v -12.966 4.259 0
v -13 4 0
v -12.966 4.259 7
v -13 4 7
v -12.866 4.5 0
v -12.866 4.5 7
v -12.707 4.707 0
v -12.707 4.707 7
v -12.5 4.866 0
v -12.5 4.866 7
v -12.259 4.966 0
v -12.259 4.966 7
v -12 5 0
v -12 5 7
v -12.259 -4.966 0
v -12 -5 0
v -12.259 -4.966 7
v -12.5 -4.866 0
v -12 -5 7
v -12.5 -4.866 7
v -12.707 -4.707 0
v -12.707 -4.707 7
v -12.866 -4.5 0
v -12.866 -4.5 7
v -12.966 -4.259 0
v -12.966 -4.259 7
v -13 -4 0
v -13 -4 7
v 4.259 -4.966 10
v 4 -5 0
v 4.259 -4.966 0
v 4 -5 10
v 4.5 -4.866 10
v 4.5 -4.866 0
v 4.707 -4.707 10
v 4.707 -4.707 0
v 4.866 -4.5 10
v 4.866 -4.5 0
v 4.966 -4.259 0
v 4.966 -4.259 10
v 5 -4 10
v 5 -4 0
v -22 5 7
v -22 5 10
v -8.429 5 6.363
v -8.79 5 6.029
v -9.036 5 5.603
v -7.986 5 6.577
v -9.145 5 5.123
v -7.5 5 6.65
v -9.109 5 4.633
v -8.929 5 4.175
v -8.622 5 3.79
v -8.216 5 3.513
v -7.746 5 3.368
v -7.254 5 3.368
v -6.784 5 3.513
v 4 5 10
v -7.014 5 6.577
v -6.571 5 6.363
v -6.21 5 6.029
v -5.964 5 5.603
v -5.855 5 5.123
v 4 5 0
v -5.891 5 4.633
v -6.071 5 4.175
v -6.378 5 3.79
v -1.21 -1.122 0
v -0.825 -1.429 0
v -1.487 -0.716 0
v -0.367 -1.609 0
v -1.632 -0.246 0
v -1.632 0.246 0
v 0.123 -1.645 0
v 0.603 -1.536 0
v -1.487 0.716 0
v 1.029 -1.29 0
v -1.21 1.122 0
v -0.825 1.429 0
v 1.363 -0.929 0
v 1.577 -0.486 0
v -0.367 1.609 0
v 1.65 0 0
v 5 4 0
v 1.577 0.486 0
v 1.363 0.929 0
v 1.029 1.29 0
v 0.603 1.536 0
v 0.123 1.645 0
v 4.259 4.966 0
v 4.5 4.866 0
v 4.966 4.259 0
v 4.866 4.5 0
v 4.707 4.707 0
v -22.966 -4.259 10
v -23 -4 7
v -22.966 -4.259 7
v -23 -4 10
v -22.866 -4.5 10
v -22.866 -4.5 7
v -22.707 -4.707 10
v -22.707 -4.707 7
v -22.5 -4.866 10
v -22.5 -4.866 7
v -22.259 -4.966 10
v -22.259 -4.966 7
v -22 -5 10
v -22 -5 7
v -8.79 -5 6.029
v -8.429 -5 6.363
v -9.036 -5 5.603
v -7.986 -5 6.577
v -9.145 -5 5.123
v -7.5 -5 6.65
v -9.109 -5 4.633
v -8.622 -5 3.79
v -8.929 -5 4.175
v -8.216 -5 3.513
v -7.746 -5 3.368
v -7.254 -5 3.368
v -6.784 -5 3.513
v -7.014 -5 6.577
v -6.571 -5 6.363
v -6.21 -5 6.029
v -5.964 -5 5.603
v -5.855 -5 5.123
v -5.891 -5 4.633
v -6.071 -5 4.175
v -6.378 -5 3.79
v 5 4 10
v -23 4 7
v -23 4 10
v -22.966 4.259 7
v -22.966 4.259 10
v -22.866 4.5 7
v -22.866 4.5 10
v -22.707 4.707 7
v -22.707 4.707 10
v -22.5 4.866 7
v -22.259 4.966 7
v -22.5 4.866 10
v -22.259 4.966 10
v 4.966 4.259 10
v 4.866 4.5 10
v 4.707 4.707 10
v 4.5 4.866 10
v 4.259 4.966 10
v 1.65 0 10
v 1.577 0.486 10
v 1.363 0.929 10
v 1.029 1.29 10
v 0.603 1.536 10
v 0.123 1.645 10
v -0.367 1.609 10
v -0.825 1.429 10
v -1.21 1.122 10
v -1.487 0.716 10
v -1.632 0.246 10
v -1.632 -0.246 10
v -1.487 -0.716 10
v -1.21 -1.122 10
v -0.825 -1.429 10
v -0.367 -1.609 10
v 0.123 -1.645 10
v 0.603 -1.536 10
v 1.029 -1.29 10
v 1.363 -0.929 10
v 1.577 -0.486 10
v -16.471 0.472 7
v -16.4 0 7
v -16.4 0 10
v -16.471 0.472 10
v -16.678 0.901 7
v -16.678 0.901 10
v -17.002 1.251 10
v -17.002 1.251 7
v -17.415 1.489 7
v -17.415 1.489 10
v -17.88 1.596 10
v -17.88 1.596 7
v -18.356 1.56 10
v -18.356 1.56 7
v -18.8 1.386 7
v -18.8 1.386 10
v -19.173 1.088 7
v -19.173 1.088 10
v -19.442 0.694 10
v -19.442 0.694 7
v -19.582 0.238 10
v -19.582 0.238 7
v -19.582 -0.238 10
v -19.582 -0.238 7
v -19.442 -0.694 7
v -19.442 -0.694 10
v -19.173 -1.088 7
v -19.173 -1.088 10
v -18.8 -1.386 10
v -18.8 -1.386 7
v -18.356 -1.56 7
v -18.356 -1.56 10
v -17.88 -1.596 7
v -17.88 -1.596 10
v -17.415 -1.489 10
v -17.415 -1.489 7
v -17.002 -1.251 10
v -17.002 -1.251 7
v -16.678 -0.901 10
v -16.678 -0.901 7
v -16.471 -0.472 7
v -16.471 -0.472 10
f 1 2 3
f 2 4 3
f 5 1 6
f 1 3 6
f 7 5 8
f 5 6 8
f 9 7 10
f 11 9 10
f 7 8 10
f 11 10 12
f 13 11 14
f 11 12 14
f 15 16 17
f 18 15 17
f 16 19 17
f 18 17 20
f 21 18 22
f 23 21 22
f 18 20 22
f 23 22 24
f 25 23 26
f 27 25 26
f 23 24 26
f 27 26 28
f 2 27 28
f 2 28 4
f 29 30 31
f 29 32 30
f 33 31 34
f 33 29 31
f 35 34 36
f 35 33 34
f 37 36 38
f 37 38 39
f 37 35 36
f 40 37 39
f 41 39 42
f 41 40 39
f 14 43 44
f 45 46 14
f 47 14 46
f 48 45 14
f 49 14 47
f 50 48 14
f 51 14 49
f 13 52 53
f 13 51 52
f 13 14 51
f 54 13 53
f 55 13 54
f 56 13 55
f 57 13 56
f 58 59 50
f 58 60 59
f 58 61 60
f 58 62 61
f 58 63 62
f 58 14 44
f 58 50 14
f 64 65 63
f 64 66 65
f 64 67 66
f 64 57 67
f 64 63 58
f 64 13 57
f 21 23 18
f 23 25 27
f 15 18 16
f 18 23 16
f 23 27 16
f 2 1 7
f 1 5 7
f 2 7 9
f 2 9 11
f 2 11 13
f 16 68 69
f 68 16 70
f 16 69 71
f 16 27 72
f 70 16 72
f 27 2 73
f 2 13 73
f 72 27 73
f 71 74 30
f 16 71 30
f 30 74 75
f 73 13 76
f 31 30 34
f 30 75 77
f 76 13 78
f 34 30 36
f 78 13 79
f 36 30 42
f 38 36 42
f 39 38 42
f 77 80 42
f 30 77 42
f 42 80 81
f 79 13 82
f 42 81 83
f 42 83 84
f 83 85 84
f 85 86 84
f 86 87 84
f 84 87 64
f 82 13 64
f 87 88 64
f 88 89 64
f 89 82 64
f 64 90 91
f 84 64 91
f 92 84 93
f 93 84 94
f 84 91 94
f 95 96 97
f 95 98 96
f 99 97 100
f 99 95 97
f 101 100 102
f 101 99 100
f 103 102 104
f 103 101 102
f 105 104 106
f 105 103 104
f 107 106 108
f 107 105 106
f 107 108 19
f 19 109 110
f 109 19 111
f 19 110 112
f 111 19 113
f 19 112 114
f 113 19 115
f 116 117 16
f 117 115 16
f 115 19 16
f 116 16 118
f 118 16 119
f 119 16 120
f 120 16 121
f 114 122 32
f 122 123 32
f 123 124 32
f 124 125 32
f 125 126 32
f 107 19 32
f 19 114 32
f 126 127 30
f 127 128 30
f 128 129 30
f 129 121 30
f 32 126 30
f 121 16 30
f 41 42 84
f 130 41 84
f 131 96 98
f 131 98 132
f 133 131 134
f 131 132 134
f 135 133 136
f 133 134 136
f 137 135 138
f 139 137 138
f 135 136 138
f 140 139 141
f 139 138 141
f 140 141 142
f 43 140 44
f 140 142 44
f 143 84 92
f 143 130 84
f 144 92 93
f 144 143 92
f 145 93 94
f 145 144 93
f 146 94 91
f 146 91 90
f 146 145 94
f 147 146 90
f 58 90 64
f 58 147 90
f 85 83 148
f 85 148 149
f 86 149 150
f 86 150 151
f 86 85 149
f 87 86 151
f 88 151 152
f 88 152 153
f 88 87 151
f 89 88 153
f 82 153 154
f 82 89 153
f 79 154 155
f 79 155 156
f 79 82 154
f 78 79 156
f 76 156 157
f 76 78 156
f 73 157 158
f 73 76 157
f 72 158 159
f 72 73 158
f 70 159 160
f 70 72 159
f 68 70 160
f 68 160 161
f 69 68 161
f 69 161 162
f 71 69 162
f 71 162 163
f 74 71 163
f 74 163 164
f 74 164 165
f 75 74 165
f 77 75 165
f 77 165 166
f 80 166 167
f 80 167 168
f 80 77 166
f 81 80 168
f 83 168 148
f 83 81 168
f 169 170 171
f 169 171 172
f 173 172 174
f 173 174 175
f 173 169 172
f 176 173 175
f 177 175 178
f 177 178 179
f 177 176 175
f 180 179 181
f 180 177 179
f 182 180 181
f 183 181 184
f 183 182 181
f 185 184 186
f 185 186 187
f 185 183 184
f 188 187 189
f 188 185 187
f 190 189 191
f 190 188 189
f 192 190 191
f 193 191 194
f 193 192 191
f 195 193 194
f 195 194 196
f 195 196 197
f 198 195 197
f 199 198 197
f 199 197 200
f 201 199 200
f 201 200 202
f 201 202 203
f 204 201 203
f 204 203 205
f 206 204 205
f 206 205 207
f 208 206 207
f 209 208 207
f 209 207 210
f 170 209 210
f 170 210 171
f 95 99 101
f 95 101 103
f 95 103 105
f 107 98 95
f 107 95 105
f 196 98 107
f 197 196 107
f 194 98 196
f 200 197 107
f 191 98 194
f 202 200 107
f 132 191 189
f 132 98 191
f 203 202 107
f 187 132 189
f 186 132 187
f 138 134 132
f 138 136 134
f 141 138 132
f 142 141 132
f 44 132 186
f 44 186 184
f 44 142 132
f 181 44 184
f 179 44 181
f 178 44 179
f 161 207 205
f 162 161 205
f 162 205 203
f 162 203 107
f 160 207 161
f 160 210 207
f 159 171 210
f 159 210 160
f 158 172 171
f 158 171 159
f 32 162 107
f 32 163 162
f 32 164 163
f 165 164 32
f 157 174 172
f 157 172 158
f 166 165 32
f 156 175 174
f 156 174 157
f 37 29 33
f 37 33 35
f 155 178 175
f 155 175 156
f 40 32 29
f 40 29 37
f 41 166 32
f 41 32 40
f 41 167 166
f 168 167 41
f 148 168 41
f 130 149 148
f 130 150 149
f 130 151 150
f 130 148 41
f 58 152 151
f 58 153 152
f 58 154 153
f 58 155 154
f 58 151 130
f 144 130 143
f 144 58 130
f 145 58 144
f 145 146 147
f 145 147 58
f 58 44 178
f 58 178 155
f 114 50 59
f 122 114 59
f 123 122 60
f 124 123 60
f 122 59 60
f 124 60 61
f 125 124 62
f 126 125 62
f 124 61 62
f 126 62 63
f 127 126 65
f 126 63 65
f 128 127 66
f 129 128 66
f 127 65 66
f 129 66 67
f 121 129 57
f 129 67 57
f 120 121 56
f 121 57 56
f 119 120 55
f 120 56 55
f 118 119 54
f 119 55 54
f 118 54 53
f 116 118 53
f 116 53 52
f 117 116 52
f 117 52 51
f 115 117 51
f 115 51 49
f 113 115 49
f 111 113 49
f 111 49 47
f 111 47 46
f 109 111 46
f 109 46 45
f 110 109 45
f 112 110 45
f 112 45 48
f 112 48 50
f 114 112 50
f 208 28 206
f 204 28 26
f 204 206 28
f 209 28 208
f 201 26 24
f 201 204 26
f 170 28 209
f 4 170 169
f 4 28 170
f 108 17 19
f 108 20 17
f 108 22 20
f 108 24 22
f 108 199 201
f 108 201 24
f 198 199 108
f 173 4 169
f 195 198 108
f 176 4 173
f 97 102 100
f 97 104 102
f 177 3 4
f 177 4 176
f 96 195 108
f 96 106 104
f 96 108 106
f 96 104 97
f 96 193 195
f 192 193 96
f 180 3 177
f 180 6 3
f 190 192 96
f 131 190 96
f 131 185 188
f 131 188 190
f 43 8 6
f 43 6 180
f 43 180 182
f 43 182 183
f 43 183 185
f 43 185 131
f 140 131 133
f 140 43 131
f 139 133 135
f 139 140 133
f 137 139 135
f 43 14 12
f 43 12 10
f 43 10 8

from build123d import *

# Parameters (mm, degrees)
SKETCH_1_W          = 28
SKETCH_1_H          = 10
SKETCH_1_R          = 1.65
SKETCH_1_R_2        = 1.6
EXTRUDE_1_DEPTH     = 10
SKETCH_2_R          = 1.65
CUT_EXTRUDE_1_DEPTH = 28
SKETCH_3_W          = 10
SKETCH_3_H          = 10
SKETCH_3_R          = 1.6
CUT_EXTRUDE_2_DEPTH = 7
FILLET_1_R          = 1


with BuildPart() as part:
    # ｽｹｯﾁ1 → ﾎﾞｽ - 押し出し1 (new body)
    with BuildSketch(Plane.XY):
        with Locations((-9, 0)):
            Rectangle(SKETCH_1_W, SKETCH_1_H)
        Circle(SKETCH_1_R, mode=Mode.SUBTRACT)
        with Locations((-18, 0)):
            Circle(SKETCH_1_R_2, mode=Mode.SUBTRACT)
    extrude(amount=EXTRUDE_1_DEPTH)

    # ｽｹｯﾁ2 → ｶｯﾄ - 押し出し1 (cut, through all)
    with BuildSketch(Plane(origin=(0, 5, 0), x_dir=(1, 0, 0), z_dir=(0, 1, 0))):
        with Locations(Location((-7.5, -5, 0), (0, 0, 270))):
            Circle(SKETCH_2_R)
    extrude(amount=-CUT_EXTRUDE_1_DEPTH, mode=Mode.SUBTRACT)

    # ｽｹｯﾁ3 → ｶｯﾄ - 押し出し2 (cut)
    with BuildSketch(Plane(origin=(0, 0, 0), x_dir=(-1, 0, 0), z_dir=(0, 0, -1))):
        with Locations((18, 0)):
            Rectangle(SKETCH_3_W, SKETCH_3_H)
        with Locations((18, 0)):
            Circle(SKETCH_3_R, mode=Mode.SUBTRACT)
    extrude(amount=-CUT_EXTRUDE_2_DEPTH, mode=Mode.SUBTRACT)

    # ﾌｨﾚｯﾄ1
    fillet_1_edges = [part.edges().sort_by_distance(p)[0] for p in [
        (-13, -5, 3.5),
        (-13, 5, 3.5),
        (5, -5, 5),
        (-23, -5, 8.5),
        (-23, 5, 8.5),
        (5, 5, 5),
    ]]
    fillet(fillet_1_edges, radius=FILLET_1_R)


solid = part.part
